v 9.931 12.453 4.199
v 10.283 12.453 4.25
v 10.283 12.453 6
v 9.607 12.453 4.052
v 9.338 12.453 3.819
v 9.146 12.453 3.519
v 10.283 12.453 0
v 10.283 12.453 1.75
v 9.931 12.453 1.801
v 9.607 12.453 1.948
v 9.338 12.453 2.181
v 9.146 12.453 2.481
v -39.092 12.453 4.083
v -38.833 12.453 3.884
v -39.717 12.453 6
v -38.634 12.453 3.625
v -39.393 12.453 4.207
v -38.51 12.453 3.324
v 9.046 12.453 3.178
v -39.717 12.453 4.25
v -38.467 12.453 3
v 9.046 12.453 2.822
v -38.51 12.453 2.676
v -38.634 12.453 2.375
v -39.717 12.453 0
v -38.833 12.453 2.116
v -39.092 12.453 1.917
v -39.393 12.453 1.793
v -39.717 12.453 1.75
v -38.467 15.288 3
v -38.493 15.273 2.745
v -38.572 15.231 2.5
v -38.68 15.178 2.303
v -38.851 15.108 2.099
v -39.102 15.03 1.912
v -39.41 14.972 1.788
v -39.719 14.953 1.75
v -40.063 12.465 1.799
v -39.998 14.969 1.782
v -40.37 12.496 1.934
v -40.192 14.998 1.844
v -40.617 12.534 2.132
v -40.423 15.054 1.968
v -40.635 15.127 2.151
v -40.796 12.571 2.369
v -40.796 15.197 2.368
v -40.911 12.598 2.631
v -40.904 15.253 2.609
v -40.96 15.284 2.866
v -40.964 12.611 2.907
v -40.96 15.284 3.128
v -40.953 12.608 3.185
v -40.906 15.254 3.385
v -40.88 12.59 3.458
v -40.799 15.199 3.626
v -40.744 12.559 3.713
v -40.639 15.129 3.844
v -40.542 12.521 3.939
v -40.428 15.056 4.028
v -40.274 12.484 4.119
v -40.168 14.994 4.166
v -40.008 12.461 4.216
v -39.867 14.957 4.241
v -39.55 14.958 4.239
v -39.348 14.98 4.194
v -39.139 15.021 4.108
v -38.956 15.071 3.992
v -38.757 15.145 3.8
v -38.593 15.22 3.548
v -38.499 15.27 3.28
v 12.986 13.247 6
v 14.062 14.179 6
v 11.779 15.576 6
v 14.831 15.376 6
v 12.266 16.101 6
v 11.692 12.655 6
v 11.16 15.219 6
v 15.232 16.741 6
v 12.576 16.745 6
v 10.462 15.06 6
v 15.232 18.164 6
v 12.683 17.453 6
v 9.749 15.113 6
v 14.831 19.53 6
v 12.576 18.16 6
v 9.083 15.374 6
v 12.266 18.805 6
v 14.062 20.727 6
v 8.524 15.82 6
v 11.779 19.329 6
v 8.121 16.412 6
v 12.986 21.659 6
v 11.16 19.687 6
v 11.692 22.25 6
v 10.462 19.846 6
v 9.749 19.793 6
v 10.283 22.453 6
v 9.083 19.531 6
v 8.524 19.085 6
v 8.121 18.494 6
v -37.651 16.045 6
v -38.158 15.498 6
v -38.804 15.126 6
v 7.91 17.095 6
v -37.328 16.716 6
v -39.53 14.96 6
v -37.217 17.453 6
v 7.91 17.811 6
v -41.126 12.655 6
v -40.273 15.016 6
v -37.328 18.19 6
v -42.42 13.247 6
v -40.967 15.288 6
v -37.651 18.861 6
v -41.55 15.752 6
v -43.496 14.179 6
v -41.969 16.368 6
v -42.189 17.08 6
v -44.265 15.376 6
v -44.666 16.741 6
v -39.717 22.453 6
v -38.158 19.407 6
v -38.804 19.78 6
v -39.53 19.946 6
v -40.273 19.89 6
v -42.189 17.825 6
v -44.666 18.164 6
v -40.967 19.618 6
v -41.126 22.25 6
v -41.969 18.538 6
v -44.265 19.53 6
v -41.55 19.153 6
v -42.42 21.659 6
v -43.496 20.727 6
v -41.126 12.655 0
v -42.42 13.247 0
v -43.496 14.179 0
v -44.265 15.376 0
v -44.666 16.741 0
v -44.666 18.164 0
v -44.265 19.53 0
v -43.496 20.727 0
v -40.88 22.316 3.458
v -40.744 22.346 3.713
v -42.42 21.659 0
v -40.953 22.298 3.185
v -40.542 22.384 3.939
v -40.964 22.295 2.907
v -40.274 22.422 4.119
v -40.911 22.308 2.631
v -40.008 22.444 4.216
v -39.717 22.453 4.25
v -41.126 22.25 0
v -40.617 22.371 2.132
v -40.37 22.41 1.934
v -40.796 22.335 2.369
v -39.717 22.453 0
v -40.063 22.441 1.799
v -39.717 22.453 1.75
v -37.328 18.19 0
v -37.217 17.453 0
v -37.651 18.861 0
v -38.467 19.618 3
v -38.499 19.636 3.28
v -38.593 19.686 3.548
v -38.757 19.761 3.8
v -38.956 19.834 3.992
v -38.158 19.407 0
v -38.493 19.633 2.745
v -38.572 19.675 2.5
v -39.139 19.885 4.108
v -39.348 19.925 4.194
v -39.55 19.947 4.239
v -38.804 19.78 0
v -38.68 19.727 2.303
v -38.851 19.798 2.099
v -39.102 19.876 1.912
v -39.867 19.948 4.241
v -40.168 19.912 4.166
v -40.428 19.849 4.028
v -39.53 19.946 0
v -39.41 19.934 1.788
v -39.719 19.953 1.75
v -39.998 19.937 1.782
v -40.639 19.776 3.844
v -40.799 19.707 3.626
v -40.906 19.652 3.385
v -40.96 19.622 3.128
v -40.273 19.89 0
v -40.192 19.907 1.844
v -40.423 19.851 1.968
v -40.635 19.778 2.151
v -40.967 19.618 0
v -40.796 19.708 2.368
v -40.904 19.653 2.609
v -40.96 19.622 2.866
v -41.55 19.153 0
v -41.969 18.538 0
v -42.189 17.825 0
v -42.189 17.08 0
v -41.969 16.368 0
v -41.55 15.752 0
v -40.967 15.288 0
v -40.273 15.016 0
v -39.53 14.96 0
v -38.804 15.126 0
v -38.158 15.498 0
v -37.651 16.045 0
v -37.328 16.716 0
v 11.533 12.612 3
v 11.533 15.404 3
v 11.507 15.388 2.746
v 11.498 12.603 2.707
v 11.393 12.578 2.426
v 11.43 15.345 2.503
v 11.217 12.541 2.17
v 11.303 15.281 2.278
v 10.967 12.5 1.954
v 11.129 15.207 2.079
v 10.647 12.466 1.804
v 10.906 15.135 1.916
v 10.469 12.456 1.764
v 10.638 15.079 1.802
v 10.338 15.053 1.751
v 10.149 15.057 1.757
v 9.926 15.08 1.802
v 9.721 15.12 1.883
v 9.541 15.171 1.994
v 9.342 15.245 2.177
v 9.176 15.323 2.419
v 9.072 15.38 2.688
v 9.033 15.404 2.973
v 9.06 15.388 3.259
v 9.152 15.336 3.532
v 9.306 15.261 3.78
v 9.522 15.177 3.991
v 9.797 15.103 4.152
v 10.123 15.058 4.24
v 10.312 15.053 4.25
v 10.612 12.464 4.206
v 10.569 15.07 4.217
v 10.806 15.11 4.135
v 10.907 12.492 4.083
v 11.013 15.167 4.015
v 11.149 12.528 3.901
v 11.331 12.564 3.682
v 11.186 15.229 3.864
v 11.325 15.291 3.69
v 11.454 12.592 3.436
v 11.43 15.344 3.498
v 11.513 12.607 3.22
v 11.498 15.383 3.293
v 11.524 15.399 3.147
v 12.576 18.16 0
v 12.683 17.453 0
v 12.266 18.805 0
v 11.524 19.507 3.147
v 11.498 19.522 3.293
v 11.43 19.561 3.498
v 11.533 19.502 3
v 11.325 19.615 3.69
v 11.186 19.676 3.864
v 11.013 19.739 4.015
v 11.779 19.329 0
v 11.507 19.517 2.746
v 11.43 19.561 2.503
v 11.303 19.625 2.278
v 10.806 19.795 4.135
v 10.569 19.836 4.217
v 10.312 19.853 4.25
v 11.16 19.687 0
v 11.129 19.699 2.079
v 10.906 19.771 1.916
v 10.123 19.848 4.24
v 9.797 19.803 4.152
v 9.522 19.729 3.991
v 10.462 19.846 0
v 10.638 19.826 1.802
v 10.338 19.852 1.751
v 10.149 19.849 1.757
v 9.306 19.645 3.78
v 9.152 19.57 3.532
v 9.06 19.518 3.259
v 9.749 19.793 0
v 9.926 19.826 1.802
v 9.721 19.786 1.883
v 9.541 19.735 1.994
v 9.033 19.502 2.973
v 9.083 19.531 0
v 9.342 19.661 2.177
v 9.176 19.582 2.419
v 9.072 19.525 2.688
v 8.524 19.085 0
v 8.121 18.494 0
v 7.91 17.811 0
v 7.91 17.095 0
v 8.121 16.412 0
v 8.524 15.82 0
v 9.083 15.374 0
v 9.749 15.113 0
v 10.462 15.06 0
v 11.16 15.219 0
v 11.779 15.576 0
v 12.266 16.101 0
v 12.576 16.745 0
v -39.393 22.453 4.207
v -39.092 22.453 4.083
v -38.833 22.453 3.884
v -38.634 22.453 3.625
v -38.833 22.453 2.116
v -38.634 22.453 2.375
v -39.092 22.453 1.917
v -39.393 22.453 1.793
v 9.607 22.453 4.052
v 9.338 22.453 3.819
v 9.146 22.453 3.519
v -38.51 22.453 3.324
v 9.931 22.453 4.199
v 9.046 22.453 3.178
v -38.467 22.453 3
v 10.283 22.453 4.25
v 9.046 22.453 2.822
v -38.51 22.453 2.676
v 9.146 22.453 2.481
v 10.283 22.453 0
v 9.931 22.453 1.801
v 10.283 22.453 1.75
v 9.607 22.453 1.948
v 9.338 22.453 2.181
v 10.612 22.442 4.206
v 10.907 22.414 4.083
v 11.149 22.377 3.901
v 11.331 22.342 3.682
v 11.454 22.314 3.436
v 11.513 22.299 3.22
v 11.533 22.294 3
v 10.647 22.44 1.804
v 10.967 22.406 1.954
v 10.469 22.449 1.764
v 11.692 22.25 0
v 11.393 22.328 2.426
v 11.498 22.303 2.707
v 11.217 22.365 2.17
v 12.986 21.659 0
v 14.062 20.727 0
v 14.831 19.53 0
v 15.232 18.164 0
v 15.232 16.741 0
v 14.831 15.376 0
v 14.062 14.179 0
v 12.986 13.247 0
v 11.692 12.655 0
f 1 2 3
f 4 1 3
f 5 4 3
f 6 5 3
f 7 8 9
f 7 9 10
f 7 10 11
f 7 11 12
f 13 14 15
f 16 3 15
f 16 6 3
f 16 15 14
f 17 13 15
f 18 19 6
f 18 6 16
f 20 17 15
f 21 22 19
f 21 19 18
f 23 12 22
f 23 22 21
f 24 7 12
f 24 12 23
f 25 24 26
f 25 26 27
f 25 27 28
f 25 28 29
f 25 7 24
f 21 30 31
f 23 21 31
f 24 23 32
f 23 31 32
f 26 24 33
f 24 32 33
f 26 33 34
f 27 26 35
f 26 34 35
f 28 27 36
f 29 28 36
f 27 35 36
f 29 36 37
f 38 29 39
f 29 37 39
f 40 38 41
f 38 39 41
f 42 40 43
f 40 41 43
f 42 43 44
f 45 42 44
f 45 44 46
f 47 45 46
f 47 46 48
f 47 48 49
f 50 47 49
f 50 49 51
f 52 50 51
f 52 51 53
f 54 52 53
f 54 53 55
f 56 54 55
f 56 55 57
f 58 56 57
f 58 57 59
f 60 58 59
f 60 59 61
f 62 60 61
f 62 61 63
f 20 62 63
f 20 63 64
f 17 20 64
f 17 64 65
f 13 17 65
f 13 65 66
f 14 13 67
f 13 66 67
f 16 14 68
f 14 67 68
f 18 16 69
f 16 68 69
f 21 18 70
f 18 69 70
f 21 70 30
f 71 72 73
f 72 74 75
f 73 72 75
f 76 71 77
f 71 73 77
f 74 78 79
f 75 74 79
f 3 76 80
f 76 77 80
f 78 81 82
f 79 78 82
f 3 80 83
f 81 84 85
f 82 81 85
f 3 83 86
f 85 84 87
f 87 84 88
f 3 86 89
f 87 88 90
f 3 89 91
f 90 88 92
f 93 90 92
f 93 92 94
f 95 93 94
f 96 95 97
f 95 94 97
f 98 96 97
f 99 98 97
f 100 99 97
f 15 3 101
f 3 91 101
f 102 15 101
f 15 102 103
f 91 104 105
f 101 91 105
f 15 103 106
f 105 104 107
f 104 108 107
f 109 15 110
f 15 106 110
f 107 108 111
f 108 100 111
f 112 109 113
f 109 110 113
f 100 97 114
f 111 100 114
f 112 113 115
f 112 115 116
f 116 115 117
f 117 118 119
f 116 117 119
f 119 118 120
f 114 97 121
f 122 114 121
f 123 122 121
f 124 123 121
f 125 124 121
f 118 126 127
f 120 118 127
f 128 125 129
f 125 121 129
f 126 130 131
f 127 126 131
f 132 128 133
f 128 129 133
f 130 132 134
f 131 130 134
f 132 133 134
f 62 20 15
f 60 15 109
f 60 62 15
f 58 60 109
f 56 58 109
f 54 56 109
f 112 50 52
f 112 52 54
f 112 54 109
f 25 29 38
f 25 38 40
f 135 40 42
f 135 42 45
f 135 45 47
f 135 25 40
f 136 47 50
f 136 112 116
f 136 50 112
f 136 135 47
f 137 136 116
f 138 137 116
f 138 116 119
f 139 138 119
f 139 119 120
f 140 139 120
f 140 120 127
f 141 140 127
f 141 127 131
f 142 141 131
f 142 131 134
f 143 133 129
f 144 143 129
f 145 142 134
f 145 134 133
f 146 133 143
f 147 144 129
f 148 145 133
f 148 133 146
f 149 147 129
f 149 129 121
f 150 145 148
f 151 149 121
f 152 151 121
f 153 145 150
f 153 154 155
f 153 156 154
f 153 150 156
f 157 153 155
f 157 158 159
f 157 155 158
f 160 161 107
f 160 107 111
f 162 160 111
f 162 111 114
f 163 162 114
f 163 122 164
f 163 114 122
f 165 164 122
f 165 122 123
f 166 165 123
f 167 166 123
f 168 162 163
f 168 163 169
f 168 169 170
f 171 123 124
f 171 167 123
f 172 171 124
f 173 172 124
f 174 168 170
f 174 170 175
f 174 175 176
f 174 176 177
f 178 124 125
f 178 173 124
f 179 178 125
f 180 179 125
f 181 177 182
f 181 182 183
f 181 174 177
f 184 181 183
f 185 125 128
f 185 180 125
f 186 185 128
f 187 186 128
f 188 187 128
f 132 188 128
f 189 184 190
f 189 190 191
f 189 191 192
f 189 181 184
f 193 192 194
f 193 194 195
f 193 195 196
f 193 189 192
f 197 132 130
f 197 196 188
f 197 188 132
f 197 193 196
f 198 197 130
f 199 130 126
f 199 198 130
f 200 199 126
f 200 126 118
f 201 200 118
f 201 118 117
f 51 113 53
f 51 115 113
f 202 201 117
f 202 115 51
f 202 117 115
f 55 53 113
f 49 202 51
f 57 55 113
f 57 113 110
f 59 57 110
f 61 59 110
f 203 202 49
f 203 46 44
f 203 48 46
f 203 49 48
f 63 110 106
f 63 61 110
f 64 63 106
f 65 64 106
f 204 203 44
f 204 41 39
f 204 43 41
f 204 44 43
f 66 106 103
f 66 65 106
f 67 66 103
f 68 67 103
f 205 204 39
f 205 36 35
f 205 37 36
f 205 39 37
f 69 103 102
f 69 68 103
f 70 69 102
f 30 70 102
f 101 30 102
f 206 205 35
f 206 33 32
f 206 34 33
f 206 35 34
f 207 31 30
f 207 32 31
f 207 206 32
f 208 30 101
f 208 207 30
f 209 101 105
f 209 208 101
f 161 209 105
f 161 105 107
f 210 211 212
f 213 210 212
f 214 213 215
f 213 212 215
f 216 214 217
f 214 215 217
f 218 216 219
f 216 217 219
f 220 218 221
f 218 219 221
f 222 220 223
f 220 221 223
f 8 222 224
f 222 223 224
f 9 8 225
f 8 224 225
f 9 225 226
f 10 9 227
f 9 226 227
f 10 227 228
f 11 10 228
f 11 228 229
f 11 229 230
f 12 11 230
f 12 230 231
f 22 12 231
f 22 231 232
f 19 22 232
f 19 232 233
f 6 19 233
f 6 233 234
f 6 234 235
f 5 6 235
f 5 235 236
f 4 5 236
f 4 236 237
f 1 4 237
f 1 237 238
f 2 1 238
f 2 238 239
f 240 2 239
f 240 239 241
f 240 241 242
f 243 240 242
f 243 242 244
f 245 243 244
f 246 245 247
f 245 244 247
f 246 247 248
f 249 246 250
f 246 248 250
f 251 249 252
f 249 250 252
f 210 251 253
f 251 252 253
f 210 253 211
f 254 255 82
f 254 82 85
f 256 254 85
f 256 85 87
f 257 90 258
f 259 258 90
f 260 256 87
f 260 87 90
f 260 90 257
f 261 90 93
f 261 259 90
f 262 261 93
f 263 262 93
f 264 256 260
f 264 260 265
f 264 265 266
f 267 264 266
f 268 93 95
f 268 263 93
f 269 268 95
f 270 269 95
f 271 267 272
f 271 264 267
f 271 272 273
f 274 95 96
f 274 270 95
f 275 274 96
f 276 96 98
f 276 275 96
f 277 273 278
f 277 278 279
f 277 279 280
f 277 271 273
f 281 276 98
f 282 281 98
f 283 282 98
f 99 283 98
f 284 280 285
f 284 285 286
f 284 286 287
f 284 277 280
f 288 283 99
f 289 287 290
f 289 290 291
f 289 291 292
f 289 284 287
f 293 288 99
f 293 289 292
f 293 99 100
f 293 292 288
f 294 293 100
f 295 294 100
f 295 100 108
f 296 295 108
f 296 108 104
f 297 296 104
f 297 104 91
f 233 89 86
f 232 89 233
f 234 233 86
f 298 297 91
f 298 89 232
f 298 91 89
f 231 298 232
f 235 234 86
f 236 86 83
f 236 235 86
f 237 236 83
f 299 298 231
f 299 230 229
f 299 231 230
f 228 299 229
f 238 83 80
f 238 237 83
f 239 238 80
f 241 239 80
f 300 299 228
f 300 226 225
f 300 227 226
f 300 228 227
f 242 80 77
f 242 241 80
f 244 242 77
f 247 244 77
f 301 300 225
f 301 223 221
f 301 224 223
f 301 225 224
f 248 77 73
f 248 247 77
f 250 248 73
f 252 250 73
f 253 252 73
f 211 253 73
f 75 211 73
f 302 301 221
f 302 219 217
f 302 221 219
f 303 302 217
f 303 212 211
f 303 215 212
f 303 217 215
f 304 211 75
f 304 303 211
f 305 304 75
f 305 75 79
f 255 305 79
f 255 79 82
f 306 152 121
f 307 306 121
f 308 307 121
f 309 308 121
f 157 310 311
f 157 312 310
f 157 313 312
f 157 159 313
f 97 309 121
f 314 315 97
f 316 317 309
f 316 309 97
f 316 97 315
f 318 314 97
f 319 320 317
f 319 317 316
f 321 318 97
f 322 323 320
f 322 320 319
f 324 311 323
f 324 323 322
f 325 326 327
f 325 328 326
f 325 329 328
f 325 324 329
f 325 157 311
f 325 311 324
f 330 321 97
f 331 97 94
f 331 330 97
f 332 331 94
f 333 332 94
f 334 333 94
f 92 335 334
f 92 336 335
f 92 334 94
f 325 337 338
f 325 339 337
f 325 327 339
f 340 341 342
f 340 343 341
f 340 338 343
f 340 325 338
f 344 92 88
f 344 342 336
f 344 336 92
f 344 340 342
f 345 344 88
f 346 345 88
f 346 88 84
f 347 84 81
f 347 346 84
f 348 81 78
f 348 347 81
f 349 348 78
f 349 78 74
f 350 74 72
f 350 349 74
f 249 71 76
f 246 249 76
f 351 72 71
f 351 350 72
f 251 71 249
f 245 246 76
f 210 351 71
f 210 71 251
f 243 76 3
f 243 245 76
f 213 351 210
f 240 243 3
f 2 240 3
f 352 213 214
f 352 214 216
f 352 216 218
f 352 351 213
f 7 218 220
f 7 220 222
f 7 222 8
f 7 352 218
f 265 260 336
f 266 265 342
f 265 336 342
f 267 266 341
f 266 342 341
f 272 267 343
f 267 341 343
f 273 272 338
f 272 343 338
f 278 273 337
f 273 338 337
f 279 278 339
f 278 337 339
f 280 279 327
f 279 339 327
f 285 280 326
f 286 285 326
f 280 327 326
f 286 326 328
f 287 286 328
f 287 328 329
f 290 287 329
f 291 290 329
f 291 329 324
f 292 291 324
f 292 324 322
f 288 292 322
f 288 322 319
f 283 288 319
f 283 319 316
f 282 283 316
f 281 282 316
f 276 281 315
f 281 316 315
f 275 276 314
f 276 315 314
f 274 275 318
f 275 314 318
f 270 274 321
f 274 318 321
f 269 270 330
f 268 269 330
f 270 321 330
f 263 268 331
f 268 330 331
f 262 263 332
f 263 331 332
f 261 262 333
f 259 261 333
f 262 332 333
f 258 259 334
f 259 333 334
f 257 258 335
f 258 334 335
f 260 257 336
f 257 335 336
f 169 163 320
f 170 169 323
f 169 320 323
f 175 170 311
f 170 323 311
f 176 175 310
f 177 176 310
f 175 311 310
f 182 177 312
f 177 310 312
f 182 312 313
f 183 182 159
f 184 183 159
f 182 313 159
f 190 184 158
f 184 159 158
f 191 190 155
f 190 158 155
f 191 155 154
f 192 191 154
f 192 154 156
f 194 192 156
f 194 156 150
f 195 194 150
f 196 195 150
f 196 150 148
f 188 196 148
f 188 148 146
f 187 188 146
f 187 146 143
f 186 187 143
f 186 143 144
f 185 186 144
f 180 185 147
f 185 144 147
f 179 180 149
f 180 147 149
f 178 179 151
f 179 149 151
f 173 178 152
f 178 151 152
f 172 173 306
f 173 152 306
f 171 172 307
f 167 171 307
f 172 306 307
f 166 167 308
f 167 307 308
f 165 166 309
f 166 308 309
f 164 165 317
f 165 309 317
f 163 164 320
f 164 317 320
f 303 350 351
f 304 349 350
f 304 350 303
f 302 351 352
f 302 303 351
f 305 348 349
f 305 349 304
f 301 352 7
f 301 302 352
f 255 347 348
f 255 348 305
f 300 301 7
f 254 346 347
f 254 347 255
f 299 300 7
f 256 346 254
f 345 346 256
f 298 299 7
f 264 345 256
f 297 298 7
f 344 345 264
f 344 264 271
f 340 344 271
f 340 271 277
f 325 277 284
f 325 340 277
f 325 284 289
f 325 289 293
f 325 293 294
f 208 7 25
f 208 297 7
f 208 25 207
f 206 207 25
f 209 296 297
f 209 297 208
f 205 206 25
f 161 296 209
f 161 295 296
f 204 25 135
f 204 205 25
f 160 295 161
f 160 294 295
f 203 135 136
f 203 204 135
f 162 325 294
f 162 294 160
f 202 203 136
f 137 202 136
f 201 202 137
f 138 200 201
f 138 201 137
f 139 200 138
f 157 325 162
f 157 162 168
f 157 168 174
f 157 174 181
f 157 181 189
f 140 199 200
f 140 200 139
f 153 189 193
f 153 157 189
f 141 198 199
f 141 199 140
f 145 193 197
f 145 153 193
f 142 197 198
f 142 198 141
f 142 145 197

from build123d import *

# Parameters (mm, degrees)
SKETCH1_R               = 2.4
SKETCH1_R_2             = 2.5
BOSS_EXTRUDE1_DEPTH     = 6
SKETCH2_R               = 1.25
CUT_EXTRUDE1_DEPTH      = 1
CUT_EXTRUDE1_DEPTH_BACK = 11


with BuildPart() as part:
    # Sketch1 → Boss-Extrude1 (new body)
    with BuildSketch(Plane.XY):
        with BuildLine():
            Line((-39.716981132, 22.452830189), (10.283018868, 22.452830189))
            ThreePointArc((10.283018868, 22.452830189), (15.283018868, 17.452830189), (10.283018868, 12.452830189))
            Line((10.283018868, 12.452830189), (-39.716981132, 12.452830189))
            ThreePointArc((-39.716981132, 12.452830189), (-44.716981132, 17.452830189), (-39.716981132, 22.452830189))
        make_face()
        with Locations((10.283018868, 17.452830189)):
            Circle(SKETCH1_R, mode=Mode.SUBTRACT)
        with Locations((-39.716981132, 17.452830189)):
            Circle(SKETCH1_R_2, mode=Mode.SUBTRACT)
    extrude(amount=BOSS_EXTRUDE1_DEPTH)

    # Sketch2 → Cut-Extrude1 (cut, two sides)
    with BuildSketch(Plane(origin=(0, 22.452830189, 0), x_dir=(1, 0, 0), z_dir=(0, 1, 0))) as cut_extrude1_sk:
        with Locations((-39.716981132, -3)):
            Circle(SKETCH2_R)
        with Locations((10.283018868, -3)):
            Circle(SKETCH2_R)
    extrude(amount=CUT_EXTRUDE1_DEPTH, mode=Mode.SUBTRACT)
    extrude(cut_extrude1_sk.sketch, amount=-CUT_EXTRUDE1_DEPTH_BACK, mode=Mode.SUBTRACT)


solid = part.part
